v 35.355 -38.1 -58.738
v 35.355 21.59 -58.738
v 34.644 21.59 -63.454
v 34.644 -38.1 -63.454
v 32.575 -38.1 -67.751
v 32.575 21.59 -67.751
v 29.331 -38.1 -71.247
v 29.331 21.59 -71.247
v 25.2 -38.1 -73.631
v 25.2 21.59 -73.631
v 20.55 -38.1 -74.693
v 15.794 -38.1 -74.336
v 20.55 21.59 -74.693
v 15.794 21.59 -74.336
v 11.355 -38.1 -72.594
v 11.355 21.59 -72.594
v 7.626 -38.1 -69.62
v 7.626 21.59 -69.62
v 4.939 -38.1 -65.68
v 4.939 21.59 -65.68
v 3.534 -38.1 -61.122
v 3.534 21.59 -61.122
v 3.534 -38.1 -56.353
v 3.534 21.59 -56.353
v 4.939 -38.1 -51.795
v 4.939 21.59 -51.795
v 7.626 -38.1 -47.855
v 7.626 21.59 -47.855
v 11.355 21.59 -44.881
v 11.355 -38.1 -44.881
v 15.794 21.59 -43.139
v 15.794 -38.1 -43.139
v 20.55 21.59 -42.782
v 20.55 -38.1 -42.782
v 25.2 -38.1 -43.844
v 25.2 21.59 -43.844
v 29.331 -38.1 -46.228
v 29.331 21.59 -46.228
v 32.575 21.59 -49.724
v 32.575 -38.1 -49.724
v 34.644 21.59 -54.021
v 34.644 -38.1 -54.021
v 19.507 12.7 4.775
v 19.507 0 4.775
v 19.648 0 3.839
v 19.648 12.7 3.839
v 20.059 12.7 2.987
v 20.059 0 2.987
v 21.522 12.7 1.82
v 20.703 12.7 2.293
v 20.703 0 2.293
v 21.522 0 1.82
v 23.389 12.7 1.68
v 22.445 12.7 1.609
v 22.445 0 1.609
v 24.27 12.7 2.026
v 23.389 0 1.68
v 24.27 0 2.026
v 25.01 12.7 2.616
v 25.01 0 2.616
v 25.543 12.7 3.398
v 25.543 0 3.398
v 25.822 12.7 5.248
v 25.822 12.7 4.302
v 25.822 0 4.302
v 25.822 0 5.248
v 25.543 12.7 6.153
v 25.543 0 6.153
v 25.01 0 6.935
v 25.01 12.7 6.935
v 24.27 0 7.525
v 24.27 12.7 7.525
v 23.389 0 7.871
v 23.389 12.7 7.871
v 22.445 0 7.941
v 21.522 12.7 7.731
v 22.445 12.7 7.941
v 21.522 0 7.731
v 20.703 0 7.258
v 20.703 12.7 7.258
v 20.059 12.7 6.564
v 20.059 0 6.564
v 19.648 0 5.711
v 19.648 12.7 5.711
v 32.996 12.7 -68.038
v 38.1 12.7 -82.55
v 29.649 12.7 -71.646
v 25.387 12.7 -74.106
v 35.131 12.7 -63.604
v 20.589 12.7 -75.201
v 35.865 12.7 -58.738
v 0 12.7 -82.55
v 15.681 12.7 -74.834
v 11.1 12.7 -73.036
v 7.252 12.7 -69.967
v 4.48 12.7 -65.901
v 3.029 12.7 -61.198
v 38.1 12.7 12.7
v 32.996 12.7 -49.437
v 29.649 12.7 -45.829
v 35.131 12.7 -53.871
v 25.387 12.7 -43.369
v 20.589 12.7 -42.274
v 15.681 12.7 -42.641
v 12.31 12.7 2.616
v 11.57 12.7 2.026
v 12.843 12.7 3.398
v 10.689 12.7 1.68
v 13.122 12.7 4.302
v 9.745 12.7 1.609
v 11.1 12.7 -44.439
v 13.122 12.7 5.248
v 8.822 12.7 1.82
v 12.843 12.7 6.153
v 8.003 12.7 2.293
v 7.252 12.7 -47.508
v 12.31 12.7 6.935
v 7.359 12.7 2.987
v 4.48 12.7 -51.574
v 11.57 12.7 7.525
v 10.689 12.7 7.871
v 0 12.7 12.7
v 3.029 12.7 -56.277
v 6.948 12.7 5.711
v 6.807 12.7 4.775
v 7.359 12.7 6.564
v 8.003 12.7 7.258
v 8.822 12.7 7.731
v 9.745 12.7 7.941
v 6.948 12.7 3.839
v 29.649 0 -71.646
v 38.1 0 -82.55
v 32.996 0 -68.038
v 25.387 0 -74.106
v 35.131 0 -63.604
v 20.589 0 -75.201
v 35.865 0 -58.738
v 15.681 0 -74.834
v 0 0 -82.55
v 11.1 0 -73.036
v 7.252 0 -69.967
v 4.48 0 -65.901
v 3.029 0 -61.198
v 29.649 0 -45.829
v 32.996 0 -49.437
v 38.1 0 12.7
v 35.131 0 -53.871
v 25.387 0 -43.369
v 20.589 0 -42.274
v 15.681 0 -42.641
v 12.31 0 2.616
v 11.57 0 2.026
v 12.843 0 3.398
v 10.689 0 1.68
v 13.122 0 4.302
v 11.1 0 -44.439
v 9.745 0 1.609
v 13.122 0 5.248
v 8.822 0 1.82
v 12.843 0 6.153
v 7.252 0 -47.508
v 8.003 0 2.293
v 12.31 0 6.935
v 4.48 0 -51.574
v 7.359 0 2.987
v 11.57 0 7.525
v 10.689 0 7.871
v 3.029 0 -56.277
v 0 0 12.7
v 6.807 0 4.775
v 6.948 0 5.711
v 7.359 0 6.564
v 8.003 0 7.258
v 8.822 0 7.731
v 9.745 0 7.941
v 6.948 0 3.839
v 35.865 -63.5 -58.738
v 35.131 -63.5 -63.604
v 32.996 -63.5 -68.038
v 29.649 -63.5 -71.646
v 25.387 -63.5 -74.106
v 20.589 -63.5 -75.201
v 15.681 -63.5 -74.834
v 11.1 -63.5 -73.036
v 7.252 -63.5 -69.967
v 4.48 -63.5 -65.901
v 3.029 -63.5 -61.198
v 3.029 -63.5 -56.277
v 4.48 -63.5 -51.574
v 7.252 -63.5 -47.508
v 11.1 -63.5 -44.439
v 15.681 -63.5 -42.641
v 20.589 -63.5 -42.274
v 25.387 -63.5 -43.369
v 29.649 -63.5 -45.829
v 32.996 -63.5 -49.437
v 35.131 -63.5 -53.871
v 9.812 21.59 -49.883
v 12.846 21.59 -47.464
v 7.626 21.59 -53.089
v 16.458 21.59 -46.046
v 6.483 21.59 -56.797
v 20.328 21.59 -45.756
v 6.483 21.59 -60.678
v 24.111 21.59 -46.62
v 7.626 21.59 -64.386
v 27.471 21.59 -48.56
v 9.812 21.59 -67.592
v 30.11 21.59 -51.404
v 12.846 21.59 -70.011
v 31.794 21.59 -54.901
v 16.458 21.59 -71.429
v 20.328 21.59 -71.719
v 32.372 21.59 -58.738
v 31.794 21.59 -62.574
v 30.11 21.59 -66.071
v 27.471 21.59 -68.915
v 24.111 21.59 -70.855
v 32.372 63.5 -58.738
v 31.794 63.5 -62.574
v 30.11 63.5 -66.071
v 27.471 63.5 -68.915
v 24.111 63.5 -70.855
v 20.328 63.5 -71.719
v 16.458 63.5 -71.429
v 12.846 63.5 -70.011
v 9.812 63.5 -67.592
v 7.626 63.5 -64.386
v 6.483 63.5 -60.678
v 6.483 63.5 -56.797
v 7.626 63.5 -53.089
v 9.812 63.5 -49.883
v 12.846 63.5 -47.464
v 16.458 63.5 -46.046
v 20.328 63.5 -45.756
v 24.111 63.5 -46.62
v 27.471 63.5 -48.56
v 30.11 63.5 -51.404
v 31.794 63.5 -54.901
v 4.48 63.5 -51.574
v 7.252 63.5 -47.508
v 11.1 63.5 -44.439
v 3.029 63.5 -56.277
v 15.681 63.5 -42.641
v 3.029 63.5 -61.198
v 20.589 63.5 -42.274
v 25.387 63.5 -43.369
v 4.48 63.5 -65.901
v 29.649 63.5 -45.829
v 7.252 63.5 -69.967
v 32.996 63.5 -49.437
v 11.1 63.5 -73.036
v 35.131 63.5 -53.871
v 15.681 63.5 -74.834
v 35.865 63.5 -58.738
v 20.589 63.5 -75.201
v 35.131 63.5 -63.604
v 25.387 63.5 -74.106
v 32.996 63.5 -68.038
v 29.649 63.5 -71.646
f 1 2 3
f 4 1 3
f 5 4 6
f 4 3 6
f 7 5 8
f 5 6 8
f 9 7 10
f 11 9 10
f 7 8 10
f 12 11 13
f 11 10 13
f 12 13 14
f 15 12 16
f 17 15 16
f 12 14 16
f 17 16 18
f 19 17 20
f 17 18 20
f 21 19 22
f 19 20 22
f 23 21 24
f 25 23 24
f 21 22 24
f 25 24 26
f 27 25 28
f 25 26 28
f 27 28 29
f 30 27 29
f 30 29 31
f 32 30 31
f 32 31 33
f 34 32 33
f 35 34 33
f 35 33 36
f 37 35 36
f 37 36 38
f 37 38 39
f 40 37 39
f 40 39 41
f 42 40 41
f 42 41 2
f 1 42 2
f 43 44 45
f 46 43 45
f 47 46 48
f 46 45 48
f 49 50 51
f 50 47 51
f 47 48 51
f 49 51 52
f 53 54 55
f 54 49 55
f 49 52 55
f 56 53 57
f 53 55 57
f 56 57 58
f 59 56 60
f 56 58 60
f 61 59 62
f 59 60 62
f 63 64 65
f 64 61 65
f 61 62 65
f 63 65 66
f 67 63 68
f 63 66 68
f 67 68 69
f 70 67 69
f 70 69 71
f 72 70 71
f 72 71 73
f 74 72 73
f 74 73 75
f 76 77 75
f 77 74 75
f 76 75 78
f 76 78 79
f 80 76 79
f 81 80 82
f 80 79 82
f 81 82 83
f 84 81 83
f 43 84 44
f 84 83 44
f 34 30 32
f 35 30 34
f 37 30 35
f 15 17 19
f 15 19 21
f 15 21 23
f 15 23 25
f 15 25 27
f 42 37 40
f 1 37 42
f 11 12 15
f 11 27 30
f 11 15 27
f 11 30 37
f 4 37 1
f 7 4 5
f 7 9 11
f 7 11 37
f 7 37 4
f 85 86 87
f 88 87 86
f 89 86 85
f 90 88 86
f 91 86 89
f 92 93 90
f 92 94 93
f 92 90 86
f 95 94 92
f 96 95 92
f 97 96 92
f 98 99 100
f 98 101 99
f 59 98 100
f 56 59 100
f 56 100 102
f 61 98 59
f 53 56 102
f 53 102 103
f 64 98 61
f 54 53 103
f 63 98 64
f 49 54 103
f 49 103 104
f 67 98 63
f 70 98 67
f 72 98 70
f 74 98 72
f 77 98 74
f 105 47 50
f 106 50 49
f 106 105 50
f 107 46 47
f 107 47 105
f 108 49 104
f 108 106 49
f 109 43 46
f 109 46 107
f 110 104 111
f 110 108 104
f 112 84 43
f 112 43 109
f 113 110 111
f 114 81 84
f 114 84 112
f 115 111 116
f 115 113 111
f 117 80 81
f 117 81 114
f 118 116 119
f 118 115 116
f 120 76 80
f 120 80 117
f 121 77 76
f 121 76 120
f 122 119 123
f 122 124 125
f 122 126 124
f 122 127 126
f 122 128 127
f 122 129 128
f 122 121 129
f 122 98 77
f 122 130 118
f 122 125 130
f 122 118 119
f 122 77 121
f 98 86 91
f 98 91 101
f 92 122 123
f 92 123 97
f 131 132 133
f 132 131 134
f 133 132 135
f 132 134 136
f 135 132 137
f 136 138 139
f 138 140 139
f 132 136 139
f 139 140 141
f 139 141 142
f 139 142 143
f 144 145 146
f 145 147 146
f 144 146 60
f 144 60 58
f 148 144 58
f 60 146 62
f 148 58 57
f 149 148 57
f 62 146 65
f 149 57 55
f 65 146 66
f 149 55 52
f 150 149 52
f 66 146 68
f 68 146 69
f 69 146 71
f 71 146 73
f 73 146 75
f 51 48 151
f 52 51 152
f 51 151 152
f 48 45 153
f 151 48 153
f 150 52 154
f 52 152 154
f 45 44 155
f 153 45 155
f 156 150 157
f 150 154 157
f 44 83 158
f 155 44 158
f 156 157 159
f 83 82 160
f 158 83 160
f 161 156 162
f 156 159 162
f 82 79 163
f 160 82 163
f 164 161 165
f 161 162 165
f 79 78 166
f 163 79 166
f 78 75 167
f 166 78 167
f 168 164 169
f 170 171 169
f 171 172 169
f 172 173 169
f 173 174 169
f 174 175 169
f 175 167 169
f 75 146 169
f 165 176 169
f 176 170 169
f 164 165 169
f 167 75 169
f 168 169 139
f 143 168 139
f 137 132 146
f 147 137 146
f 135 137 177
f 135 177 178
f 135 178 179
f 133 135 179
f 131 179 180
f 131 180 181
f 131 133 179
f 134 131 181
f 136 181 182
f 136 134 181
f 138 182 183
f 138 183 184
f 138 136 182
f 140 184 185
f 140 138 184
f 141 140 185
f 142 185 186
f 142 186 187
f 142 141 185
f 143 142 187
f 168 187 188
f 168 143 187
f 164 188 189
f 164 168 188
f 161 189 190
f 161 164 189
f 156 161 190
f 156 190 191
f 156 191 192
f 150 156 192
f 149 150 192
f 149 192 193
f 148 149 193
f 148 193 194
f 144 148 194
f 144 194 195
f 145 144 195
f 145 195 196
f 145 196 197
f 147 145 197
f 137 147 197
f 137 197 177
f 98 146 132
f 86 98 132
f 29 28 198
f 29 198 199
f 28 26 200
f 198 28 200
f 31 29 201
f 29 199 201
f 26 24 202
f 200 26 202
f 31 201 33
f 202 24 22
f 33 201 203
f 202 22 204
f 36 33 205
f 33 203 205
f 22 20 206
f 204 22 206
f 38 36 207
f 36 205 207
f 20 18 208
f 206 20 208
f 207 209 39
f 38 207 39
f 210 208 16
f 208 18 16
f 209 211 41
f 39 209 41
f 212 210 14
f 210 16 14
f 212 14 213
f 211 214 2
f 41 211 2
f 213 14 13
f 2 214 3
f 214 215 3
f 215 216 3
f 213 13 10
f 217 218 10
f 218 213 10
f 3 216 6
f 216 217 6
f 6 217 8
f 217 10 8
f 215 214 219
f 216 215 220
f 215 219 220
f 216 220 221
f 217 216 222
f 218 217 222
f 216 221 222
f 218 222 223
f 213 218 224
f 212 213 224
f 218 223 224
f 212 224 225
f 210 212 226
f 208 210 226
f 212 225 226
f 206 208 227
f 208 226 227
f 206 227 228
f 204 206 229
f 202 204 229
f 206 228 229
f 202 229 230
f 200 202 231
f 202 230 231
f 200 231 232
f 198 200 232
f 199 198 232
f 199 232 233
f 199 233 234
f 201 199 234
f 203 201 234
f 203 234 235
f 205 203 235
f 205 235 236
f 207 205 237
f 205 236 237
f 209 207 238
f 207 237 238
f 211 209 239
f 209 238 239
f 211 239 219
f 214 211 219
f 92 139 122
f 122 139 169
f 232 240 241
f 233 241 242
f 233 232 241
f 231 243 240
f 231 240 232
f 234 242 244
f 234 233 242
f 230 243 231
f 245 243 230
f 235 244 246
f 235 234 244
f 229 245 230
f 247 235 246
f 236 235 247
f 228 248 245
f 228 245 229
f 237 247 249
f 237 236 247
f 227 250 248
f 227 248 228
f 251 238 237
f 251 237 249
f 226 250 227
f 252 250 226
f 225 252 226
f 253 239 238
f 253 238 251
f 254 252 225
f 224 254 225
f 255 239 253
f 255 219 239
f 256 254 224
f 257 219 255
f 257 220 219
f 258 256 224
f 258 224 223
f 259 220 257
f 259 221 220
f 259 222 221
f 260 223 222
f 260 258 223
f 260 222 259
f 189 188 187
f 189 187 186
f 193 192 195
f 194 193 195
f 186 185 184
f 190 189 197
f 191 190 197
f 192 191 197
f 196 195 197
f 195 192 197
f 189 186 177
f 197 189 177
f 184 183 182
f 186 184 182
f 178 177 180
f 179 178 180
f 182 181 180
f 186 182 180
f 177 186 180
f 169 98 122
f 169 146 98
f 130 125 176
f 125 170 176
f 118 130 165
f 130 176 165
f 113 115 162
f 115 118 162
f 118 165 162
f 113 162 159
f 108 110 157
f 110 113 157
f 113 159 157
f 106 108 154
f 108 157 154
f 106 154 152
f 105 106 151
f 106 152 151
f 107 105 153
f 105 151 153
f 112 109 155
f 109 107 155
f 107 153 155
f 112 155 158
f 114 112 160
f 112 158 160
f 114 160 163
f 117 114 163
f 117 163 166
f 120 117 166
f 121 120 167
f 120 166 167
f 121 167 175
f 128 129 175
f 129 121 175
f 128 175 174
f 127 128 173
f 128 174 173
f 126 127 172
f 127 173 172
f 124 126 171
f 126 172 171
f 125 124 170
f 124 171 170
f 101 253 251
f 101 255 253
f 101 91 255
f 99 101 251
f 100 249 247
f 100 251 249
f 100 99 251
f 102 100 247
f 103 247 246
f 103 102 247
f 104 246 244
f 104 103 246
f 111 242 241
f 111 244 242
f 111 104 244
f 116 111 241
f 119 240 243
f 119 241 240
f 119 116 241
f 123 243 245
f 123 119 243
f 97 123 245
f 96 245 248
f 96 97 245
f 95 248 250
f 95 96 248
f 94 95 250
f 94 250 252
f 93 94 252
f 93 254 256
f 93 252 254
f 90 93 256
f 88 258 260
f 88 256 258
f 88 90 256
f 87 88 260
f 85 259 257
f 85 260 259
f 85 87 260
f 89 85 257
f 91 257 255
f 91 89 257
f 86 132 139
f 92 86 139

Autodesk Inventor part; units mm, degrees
ref_plane "YZ Plane" through (0, 0, 0) normal (1, 0, 0) x (0, 1, 0)
ref_plane "XZ Plane" through (0, 0, 0) normal (0, 1, 0) x (-1, 0, 0)
ref_plane "XY Plane" through (0, 0, 0) normal (0, 0, 1) x (1, 0, 0)
sketch "Sketch1" plane through (0, 0, 0) normal (0, 1, 0) x (-1, 0, 0)
  line L0 (0, 0) -> (-38.1, 0)
  line L1 (-38.1, 0) -> (-38.1, -82.55)
  line L2 (-38.1, -82.55) -> (0, -82.55)
  line L3 (0, -82.55) -> (0, 0)
  circle A0 centre (-22.6822, 4.7752) radius 3.175
  circle A1 centre (-9.9822, 4.7752) radius 3.175
  line L4 (0, 0) -> (-38.1, 0)
  line L5 (-38.1, 0) -> (-38.1, 12.7)
  line L6 (-38.1, 12.7) -> (0, 12.7)
  line L7 (0, 12.7) -> (0, 0)
  dimension "d0" = 38.1
  dimension "d1" = 82.55
  dimension "d24" = 6.35
  dimension "d25" = 15.4178
  dimension "d27" = 6.35
  dimension "d28" = 12.7
  dimension "d29" = 12.7
  dimension "d30" = 7.9248
extrude "Extrusion1" add sketch "Sketch1" along normal blind 12.7
sketch "Sketch2" plane through (0, 12.7, 0) normal (0, 1, 0) x (1, 0, 0)
  circle A0 centre (19.3548, 58.7375) radius 16.51
  line L0 (0, 82.55) -> (0, 0) projected
  line L1 (38.1, 82.55) -> (0, 82.55) projected
  point P0 (9.6774, 7.9375)
  dimension "d8" = 33.02
  dimension "d23" = 9.6774
extrude "Extrusion2" add sketch "Sketch2" along normal blind 50.8 and the other way blind 76.2
sketch "Sketch3" plane through (19.3548, 63.5, -58.7375) normal (0, 1, 0) x (1, 0, 0)
  circle A0 centre (0, 0) radius 13.0175
  point P0 (-19.3548, -58.7375)
  dimension "d17" = 26.035
extrude "Extrusion3" cut sketch "Sketch3" against normal blind 41.91
sketch "Sketch4" plane through (19.3548, 21.59, -58.7375) normal (0, 1, 0) x (1, 0, 0)
  circle A0 centre (0, 0) radius 16
  point P0 (-19.3548, -58.7375)
  dimension "d20" = 31.9999
extrude "Extrusion4" cut sketch "Sketch4" against normal blind 59.69
properties part number "Flip up and down motion motor mount"
